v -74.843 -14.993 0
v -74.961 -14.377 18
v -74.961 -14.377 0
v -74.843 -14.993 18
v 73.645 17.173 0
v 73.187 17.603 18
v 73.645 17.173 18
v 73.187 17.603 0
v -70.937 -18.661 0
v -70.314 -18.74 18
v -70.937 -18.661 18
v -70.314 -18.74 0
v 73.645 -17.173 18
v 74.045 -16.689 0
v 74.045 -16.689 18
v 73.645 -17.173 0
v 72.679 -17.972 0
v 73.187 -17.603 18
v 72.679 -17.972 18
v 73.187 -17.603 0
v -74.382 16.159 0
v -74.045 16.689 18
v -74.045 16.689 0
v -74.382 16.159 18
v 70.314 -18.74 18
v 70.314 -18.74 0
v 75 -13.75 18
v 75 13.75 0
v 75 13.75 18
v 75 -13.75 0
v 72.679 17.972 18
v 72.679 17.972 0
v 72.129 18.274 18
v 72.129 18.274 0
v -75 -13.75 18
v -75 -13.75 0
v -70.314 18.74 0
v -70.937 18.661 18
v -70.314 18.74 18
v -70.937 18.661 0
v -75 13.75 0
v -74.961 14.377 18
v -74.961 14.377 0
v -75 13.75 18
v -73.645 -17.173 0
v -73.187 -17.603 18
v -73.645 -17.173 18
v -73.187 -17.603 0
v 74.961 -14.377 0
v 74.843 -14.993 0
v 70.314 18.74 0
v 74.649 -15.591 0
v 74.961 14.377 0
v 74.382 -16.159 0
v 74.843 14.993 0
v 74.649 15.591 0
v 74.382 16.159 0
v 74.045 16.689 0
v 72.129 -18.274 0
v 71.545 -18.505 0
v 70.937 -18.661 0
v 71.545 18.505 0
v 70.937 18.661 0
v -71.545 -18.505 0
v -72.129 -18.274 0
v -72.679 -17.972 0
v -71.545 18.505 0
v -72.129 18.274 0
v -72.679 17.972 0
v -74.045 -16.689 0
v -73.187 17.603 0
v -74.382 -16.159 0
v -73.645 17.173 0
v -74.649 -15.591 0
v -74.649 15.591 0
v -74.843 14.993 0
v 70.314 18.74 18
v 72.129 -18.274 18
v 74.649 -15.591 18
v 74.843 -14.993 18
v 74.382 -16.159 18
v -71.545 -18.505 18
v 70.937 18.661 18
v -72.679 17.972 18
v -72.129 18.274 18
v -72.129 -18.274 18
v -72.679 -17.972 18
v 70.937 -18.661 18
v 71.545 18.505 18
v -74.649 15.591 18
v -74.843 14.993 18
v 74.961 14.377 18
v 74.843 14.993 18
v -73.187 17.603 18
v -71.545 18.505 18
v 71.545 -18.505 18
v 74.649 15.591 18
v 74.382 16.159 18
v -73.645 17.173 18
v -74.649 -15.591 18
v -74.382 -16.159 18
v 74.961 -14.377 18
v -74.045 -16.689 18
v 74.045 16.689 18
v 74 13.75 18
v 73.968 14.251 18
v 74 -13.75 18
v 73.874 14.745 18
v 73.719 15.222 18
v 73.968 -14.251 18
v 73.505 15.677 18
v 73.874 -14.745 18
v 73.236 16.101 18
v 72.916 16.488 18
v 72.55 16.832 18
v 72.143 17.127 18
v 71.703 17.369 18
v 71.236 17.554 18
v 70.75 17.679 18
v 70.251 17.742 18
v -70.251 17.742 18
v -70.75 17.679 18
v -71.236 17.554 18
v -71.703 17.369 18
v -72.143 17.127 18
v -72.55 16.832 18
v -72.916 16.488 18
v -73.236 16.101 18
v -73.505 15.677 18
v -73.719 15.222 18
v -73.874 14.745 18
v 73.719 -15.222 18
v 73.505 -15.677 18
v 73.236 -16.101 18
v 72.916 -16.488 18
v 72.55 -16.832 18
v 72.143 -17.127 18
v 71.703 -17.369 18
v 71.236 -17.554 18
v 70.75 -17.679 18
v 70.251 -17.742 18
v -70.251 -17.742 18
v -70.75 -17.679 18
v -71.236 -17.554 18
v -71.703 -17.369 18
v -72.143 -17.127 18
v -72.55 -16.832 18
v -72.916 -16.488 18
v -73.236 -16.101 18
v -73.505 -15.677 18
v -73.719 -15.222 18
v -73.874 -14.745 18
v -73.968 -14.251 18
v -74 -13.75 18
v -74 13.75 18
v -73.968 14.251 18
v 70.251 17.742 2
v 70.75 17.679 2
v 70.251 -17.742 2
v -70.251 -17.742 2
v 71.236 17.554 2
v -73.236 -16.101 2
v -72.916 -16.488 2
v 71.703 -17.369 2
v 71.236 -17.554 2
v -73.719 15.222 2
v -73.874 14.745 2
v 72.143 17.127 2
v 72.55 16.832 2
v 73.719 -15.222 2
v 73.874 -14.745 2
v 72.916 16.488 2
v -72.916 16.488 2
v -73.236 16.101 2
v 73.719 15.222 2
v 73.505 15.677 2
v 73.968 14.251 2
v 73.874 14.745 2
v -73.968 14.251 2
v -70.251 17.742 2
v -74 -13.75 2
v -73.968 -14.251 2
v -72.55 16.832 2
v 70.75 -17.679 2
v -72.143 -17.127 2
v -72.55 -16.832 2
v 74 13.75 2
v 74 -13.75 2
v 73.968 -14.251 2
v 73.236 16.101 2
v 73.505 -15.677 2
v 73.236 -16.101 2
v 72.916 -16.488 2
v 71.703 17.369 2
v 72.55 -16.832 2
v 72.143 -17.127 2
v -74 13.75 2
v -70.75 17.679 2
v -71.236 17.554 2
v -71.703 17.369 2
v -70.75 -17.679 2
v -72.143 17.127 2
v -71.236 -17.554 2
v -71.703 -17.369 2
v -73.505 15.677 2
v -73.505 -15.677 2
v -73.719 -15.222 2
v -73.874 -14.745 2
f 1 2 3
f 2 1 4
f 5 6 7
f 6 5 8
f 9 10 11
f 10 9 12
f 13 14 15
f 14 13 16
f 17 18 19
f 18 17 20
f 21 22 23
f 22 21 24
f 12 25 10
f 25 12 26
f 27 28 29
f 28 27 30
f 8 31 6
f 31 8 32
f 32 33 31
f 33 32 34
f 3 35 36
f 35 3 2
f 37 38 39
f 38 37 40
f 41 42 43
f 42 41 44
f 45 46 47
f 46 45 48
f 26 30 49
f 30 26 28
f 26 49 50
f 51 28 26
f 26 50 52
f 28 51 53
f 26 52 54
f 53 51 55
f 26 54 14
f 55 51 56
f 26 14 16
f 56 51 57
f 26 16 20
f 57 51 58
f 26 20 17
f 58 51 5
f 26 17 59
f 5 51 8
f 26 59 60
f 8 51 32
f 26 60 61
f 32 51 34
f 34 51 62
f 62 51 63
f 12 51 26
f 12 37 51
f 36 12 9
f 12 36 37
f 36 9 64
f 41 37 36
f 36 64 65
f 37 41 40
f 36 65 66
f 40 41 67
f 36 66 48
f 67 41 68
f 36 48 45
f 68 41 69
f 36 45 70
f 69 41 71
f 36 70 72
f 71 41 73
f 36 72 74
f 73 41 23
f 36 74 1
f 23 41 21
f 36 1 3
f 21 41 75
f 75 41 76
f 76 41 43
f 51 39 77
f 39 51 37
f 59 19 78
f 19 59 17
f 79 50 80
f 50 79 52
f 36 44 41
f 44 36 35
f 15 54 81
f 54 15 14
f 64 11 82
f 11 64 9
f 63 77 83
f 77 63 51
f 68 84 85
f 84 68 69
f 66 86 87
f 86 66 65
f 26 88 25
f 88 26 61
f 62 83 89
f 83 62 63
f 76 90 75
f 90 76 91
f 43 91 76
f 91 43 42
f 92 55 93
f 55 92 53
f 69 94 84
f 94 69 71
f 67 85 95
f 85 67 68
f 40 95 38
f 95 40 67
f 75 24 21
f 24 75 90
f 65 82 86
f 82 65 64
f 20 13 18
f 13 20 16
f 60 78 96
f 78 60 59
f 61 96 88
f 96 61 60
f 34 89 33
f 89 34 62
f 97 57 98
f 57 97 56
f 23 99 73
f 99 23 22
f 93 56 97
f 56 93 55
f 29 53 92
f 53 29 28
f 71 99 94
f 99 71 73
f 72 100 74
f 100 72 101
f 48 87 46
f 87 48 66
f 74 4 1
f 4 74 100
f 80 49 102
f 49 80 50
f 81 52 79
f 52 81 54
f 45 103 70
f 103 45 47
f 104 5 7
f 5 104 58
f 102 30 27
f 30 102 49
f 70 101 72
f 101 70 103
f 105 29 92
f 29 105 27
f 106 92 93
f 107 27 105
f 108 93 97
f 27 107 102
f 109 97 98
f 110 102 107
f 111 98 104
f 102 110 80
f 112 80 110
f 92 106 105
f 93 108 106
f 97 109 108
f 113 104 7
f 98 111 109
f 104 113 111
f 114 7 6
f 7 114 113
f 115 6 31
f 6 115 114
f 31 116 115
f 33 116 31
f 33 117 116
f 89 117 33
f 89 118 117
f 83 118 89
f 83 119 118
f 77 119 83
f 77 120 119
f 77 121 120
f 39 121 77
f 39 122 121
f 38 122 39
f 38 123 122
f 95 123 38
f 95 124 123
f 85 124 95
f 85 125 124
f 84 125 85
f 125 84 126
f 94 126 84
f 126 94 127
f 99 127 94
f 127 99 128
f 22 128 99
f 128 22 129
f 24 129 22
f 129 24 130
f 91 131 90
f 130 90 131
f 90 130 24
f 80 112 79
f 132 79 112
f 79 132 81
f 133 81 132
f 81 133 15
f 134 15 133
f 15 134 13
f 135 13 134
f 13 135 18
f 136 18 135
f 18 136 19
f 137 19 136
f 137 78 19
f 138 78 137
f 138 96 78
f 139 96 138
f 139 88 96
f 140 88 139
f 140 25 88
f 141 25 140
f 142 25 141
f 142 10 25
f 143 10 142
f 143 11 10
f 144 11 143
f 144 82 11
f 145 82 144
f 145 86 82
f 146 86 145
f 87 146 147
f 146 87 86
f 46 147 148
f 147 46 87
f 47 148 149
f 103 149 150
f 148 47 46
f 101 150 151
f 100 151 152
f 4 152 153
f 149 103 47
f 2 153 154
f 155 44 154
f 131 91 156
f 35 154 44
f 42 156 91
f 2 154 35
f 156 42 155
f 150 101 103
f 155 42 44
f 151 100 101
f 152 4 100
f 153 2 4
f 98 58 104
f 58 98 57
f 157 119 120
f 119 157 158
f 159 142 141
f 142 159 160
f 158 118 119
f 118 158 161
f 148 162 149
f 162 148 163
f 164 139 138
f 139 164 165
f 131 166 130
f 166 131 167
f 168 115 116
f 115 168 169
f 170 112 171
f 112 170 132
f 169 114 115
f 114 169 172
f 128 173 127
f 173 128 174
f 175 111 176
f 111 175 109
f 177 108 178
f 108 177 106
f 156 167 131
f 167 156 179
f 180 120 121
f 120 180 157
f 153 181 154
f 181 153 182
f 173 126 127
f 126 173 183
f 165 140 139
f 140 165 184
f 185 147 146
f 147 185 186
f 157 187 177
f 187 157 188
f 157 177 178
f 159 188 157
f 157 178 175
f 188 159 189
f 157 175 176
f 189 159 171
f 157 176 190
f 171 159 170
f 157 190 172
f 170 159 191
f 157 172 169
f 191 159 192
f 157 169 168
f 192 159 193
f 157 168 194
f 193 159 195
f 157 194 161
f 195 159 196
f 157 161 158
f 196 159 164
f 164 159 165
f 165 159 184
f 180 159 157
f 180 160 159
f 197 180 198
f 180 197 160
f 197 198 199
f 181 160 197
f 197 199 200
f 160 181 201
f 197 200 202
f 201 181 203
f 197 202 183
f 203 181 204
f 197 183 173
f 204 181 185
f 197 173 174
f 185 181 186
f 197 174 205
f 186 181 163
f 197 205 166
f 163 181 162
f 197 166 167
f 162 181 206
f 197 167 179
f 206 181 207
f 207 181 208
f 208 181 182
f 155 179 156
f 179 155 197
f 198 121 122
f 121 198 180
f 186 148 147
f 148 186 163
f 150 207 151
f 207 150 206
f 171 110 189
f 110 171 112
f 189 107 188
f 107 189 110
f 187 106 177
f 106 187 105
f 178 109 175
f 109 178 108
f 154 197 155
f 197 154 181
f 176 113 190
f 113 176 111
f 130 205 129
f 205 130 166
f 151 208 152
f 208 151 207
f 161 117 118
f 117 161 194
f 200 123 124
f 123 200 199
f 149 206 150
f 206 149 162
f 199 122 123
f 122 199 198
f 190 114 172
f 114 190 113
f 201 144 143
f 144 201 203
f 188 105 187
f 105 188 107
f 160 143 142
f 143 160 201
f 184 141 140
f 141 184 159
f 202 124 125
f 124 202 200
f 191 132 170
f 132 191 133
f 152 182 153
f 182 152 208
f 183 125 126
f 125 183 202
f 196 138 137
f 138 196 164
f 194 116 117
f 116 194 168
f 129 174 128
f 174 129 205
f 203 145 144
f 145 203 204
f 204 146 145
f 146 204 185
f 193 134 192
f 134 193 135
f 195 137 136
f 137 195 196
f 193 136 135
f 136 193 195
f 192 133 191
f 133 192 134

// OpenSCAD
$fn = 50;


difference() {
	union() {
		hull() {
			translate(v = [-70.0000000000, 13.7500000000, 0]) {
				cylinder(h = 18, r = 5);
			}
			translate(v = [70.0000000000, 13.7500000000, 0]) {
				cylinder(h = 18, r = 5);
			}
			translate(v = [-70.0000000000, -13.7500000000, 0]) {
				cylinder(h = 18, r = 5);
			}
			translate(v = [70.0000000000, -13.7500000000, 0]) {
				cylinder(h = 18, r = 5);
			}
		}
	}
	union() {
		translate(v = [0, 0, 2]) {
			hull() {
				translate(v = [-70.0000000000, 13.7500000000, 0]) {
					cylinder(h = 16, r = 4);
				}
				translate(v = [70.0000000000, 13.7500000000, 0]) {
					cylinder(h = 16, r = 4);
				}
				translate(v = [-70.0000000000, -13.7500000000, 0]) {
					cylinder(h = 16, r = 4);
				}
				translate(v = [70.0000000000, -13.7500000000, 0]) {
					cylinder(h = 16, r = 4);
				}
			}
		}
	}
}
